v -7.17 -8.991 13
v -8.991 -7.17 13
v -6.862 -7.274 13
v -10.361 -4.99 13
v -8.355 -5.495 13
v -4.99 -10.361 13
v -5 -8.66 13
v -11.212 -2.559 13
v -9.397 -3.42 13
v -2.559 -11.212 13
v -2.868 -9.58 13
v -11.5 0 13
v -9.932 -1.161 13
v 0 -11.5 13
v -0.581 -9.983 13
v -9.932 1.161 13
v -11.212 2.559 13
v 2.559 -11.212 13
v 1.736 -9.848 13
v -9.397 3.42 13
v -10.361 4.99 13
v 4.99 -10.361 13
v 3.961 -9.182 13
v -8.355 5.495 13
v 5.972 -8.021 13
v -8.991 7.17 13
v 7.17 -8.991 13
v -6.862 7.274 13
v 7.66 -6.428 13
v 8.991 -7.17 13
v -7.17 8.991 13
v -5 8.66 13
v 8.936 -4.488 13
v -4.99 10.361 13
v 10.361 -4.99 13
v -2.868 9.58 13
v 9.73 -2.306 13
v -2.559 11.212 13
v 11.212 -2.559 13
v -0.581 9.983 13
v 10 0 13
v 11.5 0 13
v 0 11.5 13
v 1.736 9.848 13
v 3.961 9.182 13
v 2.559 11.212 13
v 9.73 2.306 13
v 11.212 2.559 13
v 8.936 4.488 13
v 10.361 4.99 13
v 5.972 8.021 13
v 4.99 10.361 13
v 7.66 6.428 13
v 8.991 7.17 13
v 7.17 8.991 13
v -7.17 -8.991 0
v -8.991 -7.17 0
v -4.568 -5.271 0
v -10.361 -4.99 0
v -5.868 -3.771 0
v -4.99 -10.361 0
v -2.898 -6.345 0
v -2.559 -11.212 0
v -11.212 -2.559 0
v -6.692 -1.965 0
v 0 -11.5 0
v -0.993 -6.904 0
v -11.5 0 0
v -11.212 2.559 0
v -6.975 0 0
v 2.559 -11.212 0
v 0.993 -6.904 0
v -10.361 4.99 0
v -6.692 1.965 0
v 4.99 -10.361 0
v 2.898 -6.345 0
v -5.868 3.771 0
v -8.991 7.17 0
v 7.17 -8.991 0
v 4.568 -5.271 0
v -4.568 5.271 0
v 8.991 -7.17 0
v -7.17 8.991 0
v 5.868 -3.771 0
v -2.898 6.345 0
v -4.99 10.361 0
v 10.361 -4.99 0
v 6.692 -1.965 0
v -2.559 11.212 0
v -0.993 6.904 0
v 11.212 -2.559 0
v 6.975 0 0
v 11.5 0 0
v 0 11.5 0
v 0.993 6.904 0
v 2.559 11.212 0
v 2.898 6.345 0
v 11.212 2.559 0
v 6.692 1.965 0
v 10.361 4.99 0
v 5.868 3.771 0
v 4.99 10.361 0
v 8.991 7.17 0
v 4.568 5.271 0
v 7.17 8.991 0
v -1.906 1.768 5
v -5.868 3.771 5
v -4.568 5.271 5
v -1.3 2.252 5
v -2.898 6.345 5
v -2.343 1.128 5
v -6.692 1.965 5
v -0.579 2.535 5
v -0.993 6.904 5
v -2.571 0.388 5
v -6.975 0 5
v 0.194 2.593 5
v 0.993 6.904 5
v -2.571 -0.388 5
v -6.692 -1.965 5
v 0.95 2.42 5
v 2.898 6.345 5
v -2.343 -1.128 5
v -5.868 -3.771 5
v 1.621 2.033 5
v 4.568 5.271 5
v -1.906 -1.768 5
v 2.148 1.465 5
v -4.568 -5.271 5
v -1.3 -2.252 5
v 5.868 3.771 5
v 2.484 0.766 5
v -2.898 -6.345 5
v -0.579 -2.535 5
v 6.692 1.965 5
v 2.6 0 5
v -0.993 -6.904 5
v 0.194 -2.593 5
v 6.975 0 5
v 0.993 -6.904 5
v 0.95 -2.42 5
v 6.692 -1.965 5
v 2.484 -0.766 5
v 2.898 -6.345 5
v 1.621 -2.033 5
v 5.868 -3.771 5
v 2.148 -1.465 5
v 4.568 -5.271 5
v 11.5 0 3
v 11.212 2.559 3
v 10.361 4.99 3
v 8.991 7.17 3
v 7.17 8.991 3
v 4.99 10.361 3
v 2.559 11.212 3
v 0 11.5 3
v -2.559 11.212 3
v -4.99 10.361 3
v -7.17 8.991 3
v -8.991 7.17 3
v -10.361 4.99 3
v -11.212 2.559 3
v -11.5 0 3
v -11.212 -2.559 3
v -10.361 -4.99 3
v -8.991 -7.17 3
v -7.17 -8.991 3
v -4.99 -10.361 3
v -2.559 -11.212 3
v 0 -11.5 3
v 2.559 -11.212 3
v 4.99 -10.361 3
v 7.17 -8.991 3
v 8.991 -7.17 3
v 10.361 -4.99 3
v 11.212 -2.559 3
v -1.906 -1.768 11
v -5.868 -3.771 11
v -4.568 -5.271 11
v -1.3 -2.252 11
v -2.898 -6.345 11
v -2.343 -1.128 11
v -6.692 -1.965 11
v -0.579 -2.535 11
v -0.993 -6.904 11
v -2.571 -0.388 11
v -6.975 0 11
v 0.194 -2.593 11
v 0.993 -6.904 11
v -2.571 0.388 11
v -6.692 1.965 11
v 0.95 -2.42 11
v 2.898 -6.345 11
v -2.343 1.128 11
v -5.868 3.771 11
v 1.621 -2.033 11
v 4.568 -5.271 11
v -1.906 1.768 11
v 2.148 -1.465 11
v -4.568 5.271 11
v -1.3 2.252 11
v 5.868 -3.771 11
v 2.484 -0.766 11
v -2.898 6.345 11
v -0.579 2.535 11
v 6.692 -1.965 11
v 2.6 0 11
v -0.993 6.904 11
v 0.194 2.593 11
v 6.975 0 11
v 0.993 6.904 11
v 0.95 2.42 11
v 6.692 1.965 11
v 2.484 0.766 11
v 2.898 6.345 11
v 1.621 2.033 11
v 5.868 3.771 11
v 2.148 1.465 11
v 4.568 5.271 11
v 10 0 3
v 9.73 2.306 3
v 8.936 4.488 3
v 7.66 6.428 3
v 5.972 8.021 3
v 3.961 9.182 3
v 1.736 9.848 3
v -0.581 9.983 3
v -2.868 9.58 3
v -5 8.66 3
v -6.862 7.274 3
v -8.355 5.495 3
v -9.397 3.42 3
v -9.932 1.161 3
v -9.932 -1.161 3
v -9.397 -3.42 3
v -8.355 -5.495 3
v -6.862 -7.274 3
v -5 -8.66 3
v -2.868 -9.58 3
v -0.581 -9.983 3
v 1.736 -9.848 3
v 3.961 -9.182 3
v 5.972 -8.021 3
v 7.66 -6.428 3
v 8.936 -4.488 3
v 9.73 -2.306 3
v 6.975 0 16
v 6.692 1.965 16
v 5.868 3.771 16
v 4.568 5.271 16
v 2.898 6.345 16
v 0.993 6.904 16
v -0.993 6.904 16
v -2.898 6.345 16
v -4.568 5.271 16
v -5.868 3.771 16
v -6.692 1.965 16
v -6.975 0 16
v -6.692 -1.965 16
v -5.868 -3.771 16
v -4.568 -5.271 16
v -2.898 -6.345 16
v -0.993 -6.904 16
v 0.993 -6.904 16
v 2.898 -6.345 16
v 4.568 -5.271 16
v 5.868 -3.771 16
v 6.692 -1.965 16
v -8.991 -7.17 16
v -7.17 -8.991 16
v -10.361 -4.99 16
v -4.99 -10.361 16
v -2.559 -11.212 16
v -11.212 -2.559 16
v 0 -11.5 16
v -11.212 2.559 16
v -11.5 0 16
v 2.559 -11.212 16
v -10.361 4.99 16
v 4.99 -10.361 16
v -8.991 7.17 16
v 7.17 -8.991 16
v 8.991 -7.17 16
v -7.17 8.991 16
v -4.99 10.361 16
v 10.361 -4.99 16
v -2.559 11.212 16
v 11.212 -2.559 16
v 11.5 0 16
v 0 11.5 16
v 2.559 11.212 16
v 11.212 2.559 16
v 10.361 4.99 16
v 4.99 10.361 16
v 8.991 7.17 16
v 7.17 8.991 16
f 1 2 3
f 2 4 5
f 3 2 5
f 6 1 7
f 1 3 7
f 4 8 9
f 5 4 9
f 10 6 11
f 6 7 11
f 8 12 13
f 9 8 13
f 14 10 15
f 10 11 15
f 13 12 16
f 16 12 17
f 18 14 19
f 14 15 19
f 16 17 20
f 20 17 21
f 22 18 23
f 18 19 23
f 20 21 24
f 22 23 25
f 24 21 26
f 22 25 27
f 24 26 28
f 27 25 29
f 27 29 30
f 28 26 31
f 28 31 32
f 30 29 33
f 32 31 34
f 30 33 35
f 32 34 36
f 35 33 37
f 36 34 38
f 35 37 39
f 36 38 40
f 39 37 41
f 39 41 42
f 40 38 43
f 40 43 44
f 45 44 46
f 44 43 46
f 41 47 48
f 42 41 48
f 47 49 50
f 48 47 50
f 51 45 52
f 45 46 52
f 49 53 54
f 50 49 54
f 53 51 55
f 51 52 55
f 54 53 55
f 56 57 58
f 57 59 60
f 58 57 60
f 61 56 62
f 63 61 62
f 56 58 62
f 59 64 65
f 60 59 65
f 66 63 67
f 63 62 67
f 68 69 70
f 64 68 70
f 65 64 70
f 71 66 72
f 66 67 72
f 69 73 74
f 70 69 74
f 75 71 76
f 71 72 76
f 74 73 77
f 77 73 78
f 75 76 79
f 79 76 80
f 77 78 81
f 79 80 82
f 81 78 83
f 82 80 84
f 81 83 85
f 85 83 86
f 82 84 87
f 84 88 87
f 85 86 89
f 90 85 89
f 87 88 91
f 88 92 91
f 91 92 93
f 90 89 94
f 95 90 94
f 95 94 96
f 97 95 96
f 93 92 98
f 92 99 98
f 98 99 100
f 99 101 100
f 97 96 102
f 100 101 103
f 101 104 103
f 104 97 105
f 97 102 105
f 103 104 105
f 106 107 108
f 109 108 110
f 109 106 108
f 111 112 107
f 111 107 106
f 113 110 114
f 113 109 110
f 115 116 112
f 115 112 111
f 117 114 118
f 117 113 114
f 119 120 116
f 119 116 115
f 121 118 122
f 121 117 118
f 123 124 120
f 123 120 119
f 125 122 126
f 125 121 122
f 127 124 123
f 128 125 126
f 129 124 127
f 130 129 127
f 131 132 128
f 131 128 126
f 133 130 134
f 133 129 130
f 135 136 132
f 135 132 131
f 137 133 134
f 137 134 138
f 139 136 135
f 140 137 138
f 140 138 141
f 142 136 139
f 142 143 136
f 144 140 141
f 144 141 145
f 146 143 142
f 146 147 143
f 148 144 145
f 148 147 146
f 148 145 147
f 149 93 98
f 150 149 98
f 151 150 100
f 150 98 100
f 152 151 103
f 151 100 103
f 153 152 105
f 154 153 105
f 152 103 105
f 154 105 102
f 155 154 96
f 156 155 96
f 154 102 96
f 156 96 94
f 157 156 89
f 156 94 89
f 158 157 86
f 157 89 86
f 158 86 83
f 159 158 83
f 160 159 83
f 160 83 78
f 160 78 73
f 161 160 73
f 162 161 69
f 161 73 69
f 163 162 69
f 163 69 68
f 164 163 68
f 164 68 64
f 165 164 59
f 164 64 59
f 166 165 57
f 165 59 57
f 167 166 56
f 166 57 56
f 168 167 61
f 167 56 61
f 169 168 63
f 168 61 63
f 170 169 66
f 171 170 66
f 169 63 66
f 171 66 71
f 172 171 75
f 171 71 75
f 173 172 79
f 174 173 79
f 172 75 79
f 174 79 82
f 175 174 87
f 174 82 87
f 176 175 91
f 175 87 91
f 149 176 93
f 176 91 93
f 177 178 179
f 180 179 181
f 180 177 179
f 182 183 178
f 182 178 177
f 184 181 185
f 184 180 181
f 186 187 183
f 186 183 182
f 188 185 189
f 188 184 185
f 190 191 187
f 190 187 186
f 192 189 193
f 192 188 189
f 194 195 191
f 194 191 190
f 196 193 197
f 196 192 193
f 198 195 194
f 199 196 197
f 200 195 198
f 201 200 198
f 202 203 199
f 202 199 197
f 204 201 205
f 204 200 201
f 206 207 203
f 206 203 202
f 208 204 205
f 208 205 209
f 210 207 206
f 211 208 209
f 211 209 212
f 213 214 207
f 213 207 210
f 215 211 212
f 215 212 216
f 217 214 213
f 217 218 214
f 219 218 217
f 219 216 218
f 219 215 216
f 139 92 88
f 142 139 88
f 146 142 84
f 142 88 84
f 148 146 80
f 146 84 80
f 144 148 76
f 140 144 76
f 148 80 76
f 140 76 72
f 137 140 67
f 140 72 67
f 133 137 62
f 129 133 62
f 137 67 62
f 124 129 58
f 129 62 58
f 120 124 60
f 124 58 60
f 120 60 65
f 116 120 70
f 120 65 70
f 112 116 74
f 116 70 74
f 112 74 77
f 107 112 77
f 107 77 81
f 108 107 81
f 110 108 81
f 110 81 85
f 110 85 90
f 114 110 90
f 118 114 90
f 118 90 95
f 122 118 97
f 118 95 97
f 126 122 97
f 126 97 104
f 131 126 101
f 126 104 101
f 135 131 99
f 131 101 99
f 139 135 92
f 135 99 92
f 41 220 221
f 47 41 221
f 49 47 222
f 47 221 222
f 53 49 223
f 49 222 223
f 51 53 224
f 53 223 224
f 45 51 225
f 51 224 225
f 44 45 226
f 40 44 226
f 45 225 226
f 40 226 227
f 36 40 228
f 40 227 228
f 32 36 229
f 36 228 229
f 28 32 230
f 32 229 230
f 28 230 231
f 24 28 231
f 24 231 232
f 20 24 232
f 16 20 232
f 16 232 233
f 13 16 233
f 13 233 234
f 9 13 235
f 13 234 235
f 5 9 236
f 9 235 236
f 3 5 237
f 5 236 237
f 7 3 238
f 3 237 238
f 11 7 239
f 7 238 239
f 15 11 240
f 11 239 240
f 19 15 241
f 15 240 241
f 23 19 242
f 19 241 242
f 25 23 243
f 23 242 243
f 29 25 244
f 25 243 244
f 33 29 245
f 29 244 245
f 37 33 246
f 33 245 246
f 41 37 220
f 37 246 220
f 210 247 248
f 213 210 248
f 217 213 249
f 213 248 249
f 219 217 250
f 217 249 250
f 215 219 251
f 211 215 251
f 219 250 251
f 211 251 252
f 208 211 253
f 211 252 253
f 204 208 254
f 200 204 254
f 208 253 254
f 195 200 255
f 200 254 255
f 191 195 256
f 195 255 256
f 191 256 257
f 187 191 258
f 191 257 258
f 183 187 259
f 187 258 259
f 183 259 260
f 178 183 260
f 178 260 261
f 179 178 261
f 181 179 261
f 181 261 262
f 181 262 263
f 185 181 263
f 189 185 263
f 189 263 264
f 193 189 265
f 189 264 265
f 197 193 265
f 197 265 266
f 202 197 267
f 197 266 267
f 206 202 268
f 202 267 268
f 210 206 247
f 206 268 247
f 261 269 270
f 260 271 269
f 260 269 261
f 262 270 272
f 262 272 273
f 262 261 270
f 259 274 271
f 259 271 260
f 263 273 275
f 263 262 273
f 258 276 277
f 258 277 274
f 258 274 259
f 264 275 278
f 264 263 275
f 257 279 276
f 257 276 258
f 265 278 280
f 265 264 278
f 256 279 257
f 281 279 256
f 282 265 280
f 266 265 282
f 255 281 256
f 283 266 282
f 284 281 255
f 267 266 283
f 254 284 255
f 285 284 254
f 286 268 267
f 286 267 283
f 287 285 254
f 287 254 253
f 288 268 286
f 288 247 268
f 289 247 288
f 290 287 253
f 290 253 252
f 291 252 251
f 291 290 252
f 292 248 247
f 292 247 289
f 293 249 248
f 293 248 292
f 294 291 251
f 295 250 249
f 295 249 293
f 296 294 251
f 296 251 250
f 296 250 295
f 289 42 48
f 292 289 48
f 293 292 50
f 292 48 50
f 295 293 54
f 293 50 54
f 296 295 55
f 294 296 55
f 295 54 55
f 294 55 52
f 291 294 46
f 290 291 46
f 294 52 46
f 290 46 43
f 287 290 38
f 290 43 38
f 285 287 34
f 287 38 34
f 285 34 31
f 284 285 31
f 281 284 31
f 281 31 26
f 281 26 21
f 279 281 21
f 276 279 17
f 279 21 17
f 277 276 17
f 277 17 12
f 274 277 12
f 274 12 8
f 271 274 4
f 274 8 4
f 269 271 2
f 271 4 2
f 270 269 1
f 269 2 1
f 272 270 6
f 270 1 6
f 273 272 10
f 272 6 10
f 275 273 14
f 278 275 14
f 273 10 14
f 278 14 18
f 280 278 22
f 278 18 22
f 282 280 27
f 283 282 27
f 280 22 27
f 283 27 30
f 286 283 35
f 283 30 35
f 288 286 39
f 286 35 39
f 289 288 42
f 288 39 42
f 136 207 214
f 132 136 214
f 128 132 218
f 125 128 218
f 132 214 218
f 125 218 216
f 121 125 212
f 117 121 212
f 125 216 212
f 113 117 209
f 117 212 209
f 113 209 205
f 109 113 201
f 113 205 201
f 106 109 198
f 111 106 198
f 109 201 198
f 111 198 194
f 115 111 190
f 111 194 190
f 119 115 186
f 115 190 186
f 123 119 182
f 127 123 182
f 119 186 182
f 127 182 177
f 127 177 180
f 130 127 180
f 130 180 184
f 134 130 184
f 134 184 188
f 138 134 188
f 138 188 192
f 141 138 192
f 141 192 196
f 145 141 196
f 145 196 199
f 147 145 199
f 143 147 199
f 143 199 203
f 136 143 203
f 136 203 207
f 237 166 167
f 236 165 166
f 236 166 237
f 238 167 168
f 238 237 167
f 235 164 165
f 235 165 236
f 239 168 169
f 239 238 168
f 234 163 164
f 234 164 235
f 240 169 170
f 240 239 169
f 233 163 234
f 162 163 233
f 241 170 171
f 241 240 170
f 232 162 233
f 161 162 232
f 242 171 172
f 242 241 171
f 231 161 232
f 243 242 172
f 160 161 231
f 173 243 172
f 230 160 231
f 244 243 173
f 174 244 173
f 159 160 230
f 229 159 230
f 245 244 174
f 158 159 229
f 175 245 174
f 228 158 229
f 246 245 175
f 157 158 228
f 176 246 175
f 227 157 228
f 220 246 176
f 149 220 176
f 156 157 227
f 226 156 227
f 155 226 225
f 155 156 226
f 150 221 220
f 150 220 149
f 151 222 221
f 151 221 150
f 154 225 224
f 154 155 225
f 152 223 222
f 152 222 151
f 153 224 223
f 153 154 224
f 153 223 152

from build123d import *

# Parameters (mm, degrees)
SKETCH_R        = 11.5
PAD_DEPTH       = 3
SKETCH001_R     = 10
PAD001_DEPTH    = 10
SKETCH002_R     = 11.5
PAD002_DEPTH    = 3
SKETCH003_R     = 2.6
POCKET_DEPTH    = 16
SKETCH004_R     = 6.975
POCKET001_DEPTH = 5
SKETCH005_R     = 6.975
POCKET002_DEPTH = 5


with BuildPart() as part:
    # Sketch → Pad (new body)
    with BuildSketch(Plane.XY):
        Circle(SKETCH_R)
    extrude(amount=PAD_DEPTH)

    # Sketch001 (on Face3 of Pad) → Pad001 (join)
    with BuildSketch(Plane.XY.offset(3)):
        Circle(SKETCH001_R)
    extrude(amount=PAD001_DEPTH)

    # Sketch002 (on Face5 of Pad001) → Pad002 (join)
    with BuildSketch(Plane.XY.offset(13)):
        Circle(SKETCH002_R)
    extrude(amount=PAD002_DEPTH)

    # Sketch003 (on Face3 of Pad002) → Pocket (cut)
    with BuildSketch(Plane.XY.offset(16)):
        Circle(SKETCH003_R)
    extrude(amount=-POCKET_DEPTH, mode=Mode.SUBTRACT)

    # Sketch004 (on Face3 of Pocket) → Pocket001 (cut)
    with BuildSketch(Plane.XY.offset(16)):
        Circle(SKETCH004_R)
    extrude(amount=-POCKET001_DEPTH, mode=Mode.SUBTRACT)

    # Sketch005 (on Face10 of Pocket001) → Pocket002 (cut)
    with BuildSketch(Plane(origin=(0, 0, 0), x_dir=(1, 0, 0), z_dir=(0, 0, -1))):
        Circle(SKETCH005_R)
    extrude(amount=-POCKET002_DEPTH, mode=Mode.SUBTRACT)


solid = part.part
